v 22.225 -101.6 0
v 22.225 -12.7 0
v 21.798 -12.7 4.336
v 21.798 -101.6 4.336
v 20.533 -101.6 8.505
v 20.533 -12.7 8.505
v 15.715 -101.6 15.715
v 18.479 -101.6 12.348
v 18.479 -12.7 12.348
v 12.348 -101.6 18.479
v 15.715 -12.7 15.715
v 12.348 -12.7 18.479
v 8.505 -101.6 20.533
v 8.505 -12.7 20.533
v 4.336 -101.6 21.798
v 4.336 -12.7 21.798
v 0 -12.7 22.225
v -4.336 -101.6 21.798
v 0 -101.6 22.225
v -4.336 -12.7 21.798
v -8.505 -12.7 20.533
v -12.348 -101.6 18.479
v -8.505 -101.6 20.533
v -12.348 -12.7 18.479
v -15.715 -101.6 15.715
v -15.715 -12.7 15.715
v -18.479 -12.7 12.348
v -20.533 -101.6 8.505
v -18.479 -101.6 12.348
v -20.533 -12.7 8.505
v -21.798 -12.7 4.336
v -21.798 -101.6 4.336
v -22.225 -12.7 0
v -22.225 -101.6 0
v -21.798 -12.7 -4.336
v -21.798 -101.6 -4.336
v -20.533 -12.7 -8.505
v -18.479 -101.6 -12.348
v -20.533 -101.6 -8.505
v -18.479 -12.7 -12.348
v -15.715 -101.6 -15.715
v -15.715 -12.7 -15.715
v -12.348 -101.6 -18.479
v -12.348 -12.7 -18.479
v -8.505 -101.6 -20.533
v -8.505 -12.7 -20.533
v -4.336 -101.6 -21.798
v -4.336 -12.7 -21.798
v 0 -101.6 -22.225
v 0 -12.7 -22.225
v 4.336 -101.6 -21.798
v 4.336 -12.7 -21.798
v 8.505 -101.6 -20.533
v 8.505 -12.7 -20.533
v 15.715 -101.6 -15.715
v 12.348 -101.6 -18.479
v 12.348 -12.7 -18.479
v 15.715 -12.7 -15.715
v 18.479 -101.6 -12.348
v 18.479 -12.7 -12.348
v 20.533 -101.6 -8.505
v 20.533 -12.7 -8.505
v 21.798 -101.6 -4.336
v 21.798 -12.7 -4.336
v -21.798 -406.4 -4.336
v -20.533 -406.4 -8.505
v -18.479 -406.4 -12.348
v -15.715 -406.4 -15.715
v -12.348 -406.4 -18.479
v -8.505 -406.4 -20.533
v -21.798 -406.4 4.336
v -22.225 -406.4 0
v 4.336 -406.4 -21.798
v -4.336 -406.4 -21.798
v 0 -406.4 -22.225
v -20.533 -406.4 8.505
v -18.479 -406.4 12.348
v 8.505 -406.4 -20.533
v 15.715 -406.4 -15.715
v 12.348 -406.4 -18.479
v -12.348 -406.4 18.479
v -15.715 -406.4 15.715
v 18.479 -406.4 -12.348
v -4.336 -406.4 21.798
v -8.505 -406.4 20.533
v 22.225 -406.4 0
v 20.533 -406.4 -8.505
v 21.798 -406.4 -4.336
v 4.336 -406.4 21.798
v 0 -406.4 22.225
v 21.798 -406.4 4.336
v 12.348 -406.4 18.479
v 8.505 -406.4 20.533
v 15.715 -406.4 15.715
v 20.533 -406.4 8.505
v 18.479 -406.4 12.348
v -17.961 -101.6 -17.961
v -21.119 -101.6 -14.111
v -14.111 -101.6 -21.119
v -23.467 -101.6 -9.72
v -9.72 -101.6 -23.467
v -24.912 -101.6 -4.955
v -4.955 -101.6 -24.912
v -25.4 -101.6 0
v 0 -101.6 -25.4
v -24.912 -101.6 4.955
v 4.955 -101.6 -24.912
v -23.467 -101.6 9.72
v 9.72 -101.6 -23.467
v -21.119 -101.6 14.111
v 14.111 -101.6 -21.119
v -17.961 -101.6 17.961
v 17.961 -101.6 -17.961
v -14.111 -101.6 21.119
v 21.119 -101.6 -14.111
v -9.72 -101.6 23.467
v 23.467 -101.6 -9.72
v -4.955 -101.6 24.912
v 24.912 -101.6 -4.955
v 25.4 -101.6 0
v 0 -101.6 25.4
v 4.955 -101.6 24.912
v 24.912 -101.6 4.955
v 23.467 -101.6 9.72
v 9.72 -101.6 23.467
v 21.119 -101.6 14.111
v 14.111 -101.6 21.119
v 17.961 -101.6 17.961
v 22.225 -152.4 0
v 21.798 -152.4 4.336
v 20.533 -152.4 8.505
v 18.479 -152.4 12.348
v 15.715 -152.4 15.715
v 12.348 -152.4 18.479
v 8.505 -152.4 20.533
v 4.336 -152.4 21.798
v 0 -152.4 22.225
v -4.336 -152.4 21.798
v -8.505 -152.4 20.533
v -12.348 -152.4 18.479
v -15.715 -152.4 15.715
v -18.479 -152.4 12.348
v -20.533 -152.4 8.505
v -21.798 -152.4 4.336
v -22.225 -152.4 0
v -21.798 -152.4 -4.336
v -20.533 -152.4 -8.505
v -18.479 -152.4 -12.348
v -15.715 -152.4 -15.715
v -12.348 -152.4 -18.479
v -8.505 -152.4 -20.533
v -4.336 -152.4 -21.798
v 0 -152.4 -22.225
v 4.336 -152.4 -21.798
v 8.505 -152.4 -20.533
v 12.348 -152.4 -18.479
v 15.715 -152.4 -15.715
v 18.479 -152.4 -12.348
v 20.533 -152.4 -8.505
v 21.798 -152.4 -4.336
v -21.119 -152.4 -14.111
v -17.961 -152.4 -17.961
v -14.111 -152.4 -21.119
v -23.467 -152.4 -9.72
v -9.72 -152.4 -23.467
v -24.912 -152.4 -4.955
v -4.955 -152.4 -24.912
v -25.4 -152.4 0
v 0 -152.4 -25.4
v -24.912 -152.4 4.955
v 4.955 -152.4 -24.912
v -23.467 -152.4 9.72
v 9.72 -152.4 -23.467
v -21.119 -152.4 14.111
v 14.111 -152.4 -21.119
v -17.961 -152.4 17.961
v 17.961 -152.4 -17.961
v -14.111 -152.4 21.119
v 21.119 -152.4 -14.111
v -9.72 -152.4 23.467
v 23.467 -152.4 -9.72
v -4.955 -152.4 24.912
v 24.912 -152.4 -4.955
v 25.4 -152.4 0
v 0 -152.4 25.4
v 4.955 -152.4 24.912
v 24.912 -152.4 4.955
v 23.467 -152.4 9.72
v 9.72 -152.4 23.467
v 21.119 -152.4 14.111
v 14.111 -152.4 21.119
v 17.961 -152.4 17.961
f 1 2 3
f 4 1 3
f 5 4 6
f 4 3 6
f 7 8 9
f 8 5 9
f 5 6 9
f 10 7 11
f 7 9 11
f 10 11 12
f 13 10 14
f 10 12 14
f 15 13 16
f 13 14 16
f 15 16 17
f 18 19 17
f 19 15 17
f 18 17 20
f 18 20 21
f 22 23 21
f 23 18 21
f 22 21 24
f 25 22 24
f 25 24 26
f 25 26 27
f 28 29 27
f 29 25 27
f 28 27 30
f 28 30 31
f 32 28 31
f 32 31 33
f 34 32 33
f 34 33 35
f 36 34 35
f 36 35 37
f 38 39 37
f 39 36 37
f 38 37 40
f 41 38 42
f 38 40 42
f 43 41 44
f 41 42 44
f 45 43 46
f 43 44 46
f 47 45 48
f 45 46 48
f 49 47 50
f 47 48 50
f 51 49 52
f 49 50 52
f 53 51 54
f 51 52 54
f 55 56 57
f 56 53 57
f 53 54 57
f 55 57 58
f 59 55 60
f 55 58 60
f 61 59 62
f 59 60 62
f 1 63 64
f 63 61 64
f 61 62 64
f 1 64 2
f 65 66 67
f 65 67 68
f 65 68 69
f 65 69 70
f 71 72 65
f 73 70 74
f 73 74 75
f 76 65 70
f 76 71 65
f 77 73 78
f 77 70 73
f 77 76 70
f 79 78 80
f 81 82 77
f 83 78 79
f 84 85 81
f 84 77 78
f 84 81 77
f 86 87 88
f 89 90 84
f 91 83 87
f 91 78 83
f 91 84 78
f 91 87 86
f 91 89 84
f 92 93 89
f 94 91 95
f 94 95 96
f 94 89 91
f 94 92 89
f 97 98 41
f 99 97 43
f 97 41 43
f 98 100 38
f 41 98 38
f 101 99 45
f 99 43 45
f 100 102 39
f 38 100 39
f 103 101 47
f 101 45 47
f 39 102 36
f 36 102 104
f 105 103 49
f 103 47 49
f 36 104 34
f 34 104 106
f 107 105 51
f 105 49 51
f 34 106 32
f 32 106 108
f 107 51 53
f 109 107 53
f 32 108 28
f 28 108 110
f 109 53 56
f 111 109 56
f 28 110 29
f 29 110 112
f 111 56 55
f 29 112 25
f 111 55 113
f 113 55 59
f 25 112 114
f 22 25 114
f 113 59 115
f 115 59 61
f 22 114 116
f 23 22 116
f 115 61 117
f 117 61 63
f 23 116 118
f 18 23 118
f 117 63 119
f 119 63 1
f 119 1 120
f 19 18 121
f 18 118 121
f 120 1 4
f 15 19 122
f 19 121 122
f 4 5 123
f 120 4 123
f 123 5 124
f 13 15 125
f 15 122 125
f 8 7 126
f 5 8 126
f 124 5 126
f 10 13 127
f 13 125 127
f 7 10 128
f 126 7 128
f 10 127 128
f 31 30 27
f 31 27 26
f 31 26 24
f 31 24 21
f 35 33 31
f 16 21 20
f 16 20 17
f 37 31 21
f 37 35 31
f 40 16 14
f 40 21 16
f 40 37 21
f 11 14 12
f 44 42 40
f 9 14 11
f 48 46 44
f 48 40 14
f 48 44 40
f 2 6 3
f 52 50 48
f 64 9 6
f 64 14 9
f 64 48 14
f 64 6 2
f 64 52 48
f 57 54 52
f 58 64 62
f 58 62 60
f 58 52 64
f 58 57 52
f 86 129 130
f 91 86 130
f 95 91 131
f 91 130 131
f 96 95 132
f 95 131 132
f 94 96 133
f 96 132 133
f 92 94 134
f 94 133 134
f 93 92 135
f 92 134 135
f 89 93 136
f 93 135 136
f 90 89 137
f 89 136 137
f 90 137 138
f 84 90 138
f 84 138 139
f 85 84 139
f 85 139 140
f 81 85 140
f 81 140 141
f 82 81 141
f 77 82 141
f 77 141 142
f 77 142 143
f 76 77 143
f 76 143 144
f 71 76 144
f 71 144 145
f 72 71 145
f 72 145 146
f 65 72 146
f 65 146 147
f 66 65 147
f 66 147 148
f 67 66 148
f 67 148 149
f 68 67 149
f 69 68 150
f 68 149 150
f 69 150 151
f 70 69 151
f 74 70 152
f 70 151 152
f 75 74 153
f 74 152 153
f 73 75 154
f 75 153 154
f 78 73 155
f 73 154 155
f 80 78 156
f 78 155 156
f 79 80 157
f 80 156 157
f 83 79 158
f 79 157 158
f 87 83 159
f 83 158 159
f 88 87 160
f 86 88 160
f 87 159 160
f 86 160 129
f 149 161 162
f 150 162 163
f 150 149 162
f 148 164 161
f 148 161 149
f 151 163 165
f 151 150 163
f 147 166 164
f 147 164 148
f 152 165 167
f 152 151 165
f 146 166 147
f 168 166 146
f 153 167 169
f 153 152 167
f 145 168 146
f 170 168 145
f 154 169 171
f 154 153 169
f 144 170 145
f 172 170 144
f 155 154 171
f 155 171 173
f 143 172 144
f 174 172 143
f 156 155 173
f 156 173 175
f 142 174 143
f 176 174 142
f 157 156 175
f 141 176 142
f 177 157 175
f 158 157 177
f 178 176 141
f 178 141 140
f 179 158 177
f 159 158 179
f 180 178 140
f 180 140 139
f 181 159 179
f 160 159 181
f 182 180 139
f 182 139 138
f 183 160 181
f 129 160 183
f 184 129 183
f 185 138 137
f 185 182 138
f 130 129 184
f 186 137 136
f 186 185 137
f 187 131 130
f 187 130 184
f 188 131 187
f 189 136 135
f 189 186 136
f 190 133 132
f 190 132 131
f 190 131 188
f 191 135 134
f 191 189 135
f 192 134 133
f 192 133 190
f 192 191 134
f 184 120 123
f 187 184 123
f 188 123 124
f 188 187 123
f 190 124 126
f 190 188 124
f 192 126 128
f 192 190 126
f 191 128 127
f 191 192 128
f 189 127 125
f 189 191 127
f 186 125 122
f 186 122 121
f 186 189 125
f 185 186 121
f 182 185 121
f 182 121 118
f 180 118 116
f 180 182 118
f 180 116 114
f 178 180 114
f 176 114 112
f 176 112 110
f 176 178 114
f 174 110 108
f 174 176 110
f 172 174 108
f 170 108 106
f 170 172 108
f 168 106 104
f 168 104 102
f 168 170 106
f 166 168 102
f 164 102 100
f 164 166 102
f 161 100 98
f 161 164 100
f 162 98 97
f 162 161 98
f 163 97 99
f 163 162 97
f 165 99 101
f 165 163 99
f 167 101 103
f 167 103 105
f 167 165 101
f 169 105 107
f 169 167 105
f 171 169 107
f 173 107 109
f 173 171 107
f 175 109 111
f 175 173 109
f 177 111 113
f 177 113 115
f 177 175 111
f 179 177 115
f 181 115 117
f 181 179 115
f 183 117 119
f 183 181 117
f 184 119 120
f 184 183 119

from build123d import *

# Parameters (mm, degrees)
F0_R      = 22.225
F1_DEPTH  = 406.4
F3_R      = 25.4
F4_DEPTH  = 50.8
F1_FACE_R = 22.225
F5_DEPTH  = 12.7


with BuildPart() as f1:
    # F0 (on Front) → F1 (new body)
    with BuildSketch(Plane.XZ):
        Circle(F0_R)
    extrude(amount=F1_DEPTH)

    # F3 (on offset) → F4 (join)
    with BuildSketch(Plane.XZ.offset(152.4)):
        Circle(F3_R)
    extrude(amount=-F4_DEPTH)

    # F1_face (on face) → F5 (cut)
    with BuildSketch(Plane(origin=(0, 0, 0), x_dir=(1, 0, 0), z_dir=(0, 1, 0))):
        Circle(F1_FACE_R)
    extrude(amount=-F5_DEPTH, mode=Mode.SUBTRACT)


solid = f1.part
